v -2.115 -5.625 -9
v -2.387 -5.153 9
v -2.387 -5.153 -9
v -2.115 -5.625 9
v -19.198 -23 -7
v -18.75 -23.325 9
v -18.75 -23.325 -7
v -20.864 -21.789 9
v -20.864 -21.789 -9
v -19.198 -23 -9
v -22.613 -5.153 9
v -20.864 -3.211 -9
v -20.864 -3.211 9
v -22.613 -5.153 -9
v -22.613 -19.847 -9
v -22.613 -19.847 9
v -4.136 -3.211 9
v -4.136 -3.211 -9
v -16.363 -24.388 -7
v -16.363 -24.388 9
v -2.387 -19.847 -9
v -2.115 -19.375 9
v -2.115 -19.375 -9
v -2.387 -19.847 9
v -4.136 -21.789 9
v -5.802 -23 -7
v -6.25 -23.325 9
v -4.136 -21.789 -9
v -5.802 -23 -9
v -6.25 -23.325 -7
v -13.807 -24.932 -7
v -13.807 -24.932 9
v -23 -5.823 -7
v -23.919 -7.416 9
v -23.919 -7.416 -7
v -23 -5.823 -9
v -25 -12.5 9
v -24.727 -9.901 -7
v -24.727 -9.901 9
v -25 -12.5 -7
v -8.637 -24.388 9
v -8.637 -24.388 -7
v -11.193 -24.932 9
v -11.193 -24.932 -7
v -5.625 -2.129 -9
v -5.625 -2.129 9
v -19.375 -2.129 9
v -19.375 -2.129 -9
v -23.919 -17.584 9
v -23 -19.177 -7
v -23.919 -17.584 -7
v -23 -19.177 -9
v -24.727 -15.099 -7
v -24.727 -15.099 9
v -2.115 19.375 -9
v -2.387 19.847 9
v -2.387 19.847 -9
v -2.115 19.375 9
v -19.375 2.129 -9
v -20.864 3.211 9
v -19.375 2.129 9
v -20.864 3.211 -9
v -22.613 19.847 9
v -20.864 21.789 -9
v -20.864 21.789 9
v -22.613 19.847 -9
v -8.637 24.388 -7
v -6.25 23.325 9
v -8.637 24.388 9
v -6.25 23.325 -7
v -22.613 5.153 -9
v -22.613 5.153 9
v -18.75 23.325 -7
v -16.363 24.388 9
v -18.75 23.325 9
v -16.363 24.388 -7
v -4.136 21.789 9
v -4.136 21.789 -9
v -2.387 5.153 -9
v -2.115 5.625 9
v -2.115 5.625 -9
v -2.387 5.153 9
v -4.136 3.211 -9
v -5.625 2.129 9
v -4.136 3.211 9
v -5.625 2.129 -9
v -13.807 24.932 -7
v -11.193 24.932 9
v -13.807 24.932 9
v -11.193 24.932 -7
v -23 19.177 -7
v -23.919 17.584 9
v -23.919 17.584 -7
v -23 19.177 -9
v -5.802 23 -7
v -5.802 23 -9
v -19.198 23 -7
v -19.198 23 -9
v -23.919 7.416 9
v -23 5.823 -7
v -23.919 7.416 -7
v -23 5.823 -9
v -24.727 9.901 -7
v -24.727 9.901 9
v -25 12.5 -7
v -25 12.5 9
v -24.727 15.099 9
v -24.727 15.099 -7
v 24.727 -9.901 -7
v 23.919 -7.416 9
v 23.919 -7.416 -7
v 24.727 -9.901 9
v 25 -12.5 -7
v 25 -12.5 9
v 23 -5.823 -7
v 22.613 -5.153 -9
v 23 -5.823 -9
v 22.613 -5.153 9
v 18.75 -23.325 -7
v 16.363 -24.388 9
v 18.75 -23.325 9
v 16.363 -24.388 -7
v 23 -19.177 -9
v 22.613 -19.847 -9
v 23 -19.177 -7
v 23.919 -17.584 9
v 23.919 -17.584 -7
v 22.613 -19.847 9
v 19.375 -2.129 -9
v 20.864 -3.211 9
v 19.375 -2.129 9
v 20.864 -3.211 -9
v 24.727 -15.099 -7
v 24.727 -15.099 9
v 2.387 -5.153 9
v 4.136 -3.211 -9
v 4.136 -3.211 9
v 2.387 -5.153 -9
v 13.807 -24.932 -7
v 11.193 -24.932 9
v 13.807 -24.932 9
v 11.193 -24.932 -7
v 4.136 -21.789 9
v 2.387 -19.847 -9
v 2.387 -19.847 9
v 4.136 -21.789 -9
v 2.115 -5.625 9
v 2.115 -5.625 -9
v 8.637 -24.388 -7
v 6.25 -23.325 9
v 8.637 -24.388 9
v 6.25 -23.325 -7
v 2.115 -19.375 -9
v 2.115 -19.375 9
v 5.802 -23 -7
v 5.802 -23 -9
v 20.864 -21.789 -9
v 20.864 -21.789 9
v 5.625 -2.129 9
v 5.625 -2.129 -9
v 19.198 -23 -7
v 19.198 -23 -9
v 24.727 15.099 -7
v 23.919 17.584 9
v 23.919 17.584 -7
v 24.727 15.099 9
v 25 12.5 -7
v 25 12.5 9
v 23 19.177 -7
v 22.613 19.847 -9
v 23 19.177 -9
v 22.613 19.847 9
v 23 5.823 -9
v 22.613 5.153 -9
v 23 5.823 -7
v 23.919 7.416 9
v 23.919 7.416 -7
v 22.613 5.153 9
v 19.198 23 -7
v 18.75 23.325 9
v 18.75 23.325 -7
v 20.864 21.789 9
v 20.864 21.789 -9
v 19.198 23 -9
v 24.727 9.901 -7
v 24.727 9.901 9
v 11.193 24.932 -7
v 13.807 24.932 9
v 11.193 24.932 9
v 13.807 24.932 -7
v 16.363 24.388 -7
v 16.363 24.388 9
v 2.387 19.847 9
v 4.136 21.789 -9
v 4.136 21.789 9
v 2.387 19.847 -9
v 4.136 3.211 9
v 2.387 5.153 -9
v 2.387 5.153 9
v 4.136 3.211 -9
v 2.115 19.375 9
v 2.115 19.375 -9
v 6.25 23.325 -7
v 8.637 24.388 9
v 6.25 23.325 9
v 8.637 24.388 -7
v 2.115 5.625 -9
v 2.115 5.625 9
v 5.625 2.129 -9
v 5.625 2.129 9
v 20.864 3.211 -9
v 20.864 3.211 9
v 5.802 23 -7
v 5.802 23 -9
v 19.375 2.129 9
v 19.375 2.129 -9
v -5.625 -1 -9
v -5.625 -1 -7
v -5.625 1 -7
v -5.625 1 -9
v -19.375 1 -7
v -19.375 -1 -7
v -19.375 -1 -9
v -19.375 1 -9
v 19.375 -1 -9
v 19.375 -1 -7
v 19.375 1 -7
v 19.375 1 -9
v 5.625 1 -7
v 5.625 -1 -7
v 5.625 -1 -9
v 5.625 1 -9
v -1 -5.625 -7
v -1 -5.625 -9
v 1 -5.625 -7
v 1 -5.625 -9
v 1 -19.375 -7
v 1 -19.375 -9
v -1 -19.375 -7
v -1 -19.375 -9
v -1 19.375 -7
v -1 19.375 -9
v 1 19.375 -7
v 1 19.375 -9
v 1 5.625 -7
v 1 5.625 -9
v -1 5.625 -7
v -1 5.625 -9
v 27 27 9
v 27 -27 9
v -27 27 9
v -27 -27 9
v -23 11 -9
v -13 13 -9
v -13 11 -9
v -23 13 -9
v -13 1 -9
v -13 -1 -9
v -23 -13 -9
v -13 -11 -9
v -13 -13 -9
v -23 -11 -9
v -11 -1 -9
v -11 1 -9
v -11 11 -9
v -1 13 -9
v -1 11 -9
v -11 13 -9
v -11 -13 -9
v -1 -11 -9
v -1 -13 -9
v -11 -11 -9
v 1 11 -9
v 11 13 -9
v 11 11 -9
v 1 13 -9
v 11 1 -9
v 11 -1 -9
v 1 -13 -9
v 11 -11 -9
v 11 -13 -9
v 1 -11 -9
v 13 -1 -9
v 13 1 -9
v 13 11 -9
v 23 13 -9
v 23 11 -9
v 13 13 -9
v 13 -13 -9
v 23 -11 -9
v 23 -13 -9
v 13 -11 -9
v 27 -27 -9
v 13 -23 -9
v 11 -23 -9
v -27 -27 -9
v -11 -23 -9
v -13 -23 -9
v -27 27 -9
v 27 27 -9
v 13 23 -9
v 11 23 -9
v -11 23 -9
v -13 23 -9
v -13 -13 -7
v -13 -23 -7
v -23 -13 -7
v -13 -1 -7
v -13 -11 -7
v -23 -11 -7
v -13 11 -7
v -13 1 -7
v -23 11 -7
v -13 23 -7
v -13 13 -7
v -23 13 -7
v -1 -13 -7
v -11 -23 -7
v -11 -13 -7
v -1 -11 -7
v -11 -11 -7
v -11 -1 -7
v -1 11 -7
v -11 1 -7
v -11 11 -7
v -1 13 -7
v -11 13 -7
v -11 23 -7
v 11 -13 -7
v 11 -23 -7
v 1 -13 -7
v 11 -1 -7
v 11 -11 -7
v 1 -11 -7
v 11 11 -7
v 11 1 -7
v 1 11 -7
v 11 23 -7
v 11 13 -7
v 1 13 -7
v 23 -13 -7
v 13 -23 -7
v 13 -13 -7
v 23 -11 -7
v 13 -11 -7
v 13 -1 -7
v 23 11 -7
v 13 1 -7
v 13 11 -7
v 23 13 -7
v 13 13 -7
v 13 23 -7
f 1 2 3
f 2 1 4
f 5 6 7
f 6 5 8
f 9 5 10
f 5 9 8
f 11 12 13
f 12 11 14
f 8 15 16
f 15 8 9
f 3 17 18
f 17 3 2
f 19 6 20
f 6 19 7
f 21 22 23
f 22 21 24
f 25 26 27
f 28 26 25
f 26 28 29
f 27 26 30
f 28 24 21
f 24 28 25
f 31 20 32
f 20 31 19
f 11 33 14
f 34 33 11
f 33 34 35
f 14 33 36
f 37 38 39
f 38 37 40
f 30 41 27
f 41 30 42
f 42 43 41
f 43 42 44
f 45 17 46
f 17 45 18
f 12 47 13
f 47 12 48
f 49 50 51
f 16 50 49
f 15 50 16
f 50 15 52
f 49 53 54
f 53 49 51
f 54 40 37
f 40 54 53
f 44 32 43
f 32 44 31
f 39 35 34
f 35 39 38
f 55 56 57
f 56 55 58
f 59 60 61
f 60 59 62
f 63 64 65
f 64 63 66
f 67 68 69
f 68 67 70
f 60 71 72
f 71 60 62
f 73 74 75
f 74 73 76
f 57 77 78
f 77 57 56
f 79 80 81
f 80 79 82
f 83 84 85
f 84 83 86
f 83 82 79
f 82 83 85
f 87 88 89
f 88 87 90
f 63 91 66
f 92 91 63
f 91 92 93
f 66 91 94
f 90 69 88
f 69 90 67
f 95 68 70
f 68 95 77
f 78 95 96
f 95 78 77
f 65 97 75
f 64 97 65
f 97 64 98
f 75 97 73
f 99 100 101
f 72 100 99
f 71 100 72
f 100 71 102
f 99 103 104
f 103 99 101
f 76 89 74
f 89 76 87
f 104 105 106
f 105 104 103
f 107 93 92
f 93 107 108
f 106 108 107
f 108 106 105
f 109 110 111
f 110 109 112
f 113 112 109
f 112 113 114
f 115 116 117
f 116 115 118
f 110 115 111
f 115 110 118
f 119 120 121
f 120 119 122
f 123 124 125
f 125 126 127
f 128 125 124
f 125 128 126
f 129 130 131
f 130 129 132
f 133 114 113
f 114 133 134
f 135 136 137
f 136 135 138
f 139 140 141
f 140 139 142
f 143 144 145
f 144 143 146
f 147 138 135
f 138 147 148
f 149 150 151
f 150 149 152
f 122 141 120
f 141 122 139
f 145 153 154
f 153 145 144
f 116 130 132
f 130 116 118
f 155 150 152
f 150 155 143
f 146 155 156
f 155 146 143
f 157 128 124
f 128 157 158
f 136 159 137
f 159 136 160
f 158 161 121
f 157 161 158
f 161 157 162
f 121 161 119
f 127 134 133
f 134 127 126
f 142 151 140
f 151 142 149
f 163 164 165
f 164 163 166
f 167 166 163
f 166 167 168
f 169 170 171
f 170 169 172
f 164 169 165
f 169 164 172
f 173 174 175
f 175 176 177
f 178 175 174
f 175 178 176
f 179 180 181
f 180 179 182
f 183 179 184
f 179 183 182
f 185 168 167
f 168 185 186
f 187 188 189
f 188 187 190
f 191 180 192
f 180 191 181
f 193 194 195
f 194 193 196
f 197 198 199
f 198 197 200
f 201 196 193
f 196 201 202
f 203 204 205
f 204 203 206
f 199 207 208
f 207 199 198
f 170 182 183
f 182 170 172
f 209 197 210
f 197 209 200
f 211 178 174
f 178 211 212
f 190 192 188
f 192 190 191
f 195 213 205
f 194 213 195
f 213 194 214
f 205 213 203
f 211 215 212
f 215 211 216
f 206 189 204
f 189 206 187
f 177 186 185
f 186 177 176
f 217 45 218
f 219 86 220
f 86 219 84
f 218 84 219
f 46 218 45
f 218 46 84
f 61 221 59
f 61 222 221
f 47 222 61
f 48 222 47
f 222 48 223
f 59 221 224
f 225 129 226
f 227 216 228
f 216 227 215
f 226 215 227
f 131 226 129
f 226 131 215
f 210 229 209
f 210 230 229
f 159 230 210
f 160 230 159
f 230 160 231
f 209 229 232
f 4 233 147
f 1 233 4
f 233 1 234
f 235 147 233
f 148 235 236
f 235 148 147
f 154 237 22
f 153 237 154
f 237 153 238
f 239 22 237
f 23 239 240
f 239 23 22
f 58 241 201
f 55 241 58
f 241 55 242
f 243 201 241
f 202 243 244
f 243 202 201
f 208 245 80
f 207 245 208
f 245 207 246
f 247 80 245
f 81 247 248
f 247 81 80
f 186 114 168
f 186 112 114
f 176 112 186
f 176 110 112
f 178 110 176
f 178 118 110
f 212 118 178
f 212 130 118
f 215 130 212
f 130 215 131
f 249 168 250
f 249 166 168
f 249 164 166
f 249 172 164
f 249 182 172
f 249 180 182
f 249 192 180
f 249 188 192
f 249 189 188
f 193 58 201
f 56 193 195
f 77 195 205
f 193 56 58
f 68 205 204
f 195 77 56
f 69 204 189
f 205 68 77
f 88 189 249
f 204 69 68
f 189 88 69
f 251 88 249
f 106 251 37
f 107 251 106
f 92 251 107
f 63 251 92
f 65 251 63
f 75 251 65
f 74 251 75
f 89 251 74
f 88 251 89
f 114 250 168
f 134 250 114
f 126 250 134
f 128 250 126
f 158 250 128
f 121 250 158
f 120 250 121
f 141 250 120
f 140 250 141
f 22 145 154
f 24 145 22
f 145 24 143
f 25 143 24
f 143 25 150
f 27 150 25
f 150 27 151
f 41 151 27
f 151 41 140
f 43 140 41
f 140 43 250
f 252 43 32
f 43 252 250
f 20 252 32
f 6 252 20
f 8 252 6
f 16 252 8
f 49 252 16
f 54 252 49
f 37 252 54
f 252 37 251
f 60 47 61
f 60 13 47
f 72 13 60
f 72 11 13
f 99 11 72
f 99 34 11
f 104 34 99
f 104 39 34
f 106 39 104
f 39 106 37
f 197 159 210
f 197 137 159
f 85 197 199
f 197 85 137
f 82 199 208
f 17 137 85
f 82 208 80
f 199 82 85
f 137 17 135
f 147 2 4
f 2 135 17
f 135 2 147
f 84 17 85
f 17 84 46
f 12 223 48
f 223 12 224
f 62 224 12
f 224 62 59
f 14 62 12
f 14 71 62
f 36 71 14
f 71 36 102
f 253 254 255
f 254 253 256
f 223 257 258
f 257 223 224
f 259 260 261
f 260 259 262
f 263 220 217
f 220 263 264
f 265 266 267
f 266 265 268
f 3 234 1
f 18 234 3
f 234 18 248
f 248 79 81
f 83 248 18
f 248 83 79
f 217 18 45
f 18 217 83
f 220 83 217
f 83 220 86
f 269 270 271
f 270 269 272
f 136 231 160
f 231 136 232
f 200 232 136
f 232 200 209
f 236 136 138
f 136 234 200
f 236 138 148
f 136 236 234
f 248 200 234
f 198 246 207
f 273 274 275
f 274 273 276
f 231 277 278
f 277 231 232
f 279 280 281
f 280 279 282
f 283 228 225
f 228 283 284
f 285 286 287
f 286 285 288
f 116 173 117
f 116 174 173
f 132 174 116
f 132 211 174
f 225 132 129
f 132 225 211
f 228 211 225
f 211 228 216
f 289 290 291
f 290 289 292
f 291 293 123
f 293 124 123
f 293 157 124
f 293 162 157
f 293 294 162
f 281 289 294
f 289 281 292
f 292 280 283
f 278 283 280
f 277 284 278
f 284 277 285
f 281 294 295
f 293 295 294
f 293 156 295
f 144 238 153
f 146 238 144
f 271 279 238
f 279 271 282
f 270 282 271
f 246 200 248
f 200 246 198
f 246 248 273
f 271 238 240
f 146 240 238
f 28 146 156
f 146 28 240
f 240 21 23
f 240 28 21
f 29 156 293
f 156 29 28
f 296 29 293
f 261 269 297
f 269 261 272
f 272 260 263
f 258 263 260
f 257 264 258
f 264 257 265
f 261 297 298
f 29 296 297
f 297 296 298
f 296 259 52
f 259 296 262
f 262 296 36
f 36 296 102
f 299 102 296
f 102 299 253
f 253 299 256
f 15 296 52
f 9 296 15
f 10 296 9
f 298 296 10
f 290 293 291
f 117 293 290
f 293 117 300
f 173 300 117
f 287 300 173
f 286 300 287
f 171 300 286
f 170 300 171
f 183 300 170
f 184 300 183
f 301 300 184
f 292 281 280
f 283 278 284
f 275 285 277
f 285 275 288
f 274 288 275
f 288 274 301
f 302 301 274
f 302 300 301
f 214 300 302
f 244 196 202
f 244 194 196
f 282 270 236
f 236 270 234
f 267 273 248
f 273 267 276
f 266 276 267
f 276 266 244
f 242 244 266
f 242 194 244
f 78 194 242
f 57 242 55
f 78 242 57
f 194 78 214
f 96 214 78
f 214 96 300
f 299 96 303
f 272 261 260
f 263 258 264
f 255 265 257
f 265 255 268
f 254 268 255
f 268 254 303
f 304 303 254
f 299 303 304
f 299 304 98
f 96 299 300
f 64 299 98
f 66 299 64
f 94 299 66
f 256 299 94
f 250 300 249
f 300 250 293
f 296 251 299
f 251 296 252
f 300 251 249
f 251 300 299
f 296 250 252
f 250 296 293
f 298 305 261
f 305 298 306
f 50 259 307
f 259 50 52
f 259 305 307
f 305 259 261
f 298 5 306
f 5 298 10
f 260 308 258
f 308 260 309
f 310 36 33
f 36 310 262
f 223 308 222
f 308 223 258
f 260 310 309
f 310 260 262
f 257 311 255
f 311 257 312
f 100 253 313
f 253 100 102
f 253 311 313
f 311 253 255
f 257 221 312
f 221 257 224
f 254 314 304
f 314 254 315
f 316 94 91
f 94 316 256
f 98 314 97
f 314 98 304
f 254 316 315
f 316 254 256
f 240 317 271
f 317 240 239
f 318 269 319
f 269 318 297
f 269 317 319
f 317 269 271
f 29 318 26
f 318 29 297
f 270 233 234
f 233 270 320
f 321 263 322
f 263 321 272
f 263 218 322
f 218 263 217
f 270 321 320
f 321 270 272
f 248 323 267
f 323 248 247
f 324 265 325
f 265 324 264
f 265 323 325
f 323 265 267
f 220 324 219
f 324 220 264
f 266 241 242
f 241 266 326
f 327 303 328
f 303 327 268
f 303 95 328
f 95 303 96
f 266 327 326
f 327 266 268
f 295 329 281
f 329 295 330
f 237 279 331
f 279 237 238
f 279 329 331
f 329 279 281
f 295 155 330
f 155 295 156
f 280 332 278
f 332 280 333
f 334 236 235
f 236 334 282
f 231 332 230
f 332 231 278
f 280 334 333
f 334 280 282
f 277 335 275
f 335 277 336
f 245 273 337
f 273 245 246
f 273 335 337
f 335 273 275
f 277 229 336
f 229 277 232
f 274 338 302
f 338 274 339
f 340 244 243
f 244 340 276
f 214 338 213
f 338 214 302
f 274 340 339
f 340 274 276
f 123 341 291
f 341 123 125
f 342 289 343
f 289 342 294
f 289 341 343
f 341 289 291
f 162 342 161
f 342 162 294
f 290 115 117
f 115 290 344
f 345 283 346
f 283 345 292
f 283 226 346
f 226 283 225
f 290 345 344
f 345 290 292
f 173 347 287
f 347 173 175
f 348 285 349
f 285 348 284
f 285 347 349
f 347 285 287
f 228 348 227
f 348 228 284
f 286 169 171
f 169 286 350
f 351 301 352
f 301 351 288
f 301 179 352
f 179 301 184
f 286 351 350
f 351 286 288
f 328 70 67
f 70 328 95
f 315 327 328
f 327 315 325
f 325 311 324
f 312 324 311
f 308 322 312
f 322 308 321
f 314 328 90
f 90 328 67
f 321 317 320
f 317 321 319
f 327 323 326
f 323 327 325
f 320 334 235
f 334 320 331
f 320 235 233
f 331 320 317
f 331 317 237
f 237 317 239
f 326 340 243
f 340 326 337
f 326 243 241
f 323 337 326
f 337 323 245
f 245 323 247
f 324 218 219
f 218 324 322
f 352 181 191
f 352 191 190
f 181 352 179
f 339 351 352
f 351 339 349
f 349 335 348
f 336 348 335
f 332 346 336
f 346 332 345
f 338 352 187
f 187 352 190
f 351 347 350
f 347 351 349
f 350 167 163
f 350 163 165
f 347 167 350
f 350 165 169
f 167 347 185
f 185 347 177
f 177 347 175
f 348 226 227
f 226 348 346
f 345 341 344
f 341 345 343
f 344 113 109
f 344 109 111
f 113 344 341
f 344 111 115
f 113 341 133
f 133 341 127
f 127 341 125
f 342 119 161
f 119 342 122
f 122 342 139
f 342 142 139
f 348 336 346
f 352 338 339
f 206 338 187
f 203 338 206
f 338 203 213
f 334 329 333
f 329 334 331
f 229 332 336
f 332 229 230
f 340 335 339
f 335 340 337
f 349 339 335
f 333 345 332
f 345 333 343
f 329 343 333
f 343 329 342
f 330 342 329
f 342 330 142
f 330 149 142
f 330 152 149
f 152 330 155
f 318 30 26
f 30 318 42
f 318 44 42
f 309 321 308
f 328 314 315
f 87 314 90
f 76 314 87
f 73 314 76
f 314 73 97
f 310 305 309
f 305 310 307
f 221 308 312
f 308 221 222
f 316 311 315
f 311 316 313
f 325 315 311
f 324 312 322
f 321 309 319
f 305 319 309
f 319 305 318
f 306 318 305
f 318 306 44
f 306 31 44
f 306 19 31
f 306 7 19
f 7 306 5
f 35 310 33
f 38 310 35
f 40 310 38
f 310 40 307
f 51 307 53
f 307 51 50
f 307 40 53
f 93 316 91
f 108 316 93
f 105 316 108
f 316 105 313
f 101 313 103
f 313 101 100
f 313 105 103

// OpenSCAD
// file: fly_tray_modules.scad
// Contains all the necessary functions and parameters to make trays

// tray-related parameters
tr_h = 20; // mm; (should be approx food height)
sd_th = 1; // mm; 
m_th = 2; // mm; 
m_d = 10; // mm;

// vial-related parameters
v_dia = 25; // mm; vial diameter (add necessary buffer)

// bottle-related parameters
b_t_a = 55; // mm; bottle size (height same as others)
b_a = 57; // mm; effective bottle holder taking into account gaps

// base tray parameters
bs_th = 1.5; //mm; (base thickness)
bs_h = bs_th + 10; //mm; (height of base tray)

// functions
function tray_dims (h, i_a, rows, cols) = [rows*i_a, cols*i_a, h];
function tray_size (a,sd_th=sd_th) = a + [2*sd_th, 2*sd_th, 0];

// modules
module base_tray(a, sd_th, m_th, m_d){
    
    a_t = a + [2*sd_th, 2*sd_th, 0];
    
    // make side tray
    union() {
        difference(){
            cube(a_t, center=true);
            cube(a + [0,0,0.1], center=true);
        }
        
        translate([0,0,-a[2]/2+m_th/2]) mesh_sheet(a_t, m_th, m_d);
    }
    
}

module mesh_sheet(a, th, d){
    // makes mesh sheets
    
    // input wrangling
    l = is_list(a) ?  a[0] : a;
    w = is_list(a) ?  a[1] : a;
    
    // find how many meshes will fit inside this sheet
    n_l = floor(l / (d+th));
    n_w = floor(w / (d+th));
    

    // make mesh
    difference(){
        // base cube
        cube([l, w, th], center=true);
        
        trans = th+d;
        x_pos = [-(n_l/2)+0.5:1:(n_l/2)-0.5];
        y_pos = [-(n_w/2)+0.5:1:(n_w/2)-0.5];

        // subtract cubes to create mesh
        for (i=x_pos, j=y_pos)
            translate([i*trans, j*trans, 0]) cube([d,d,th+0.1], center=true);        
    }
}

module vial_tray(a, v_dia, v_red=0.5){
    // input wrangling
    rows = a[0]/v_dia;
    cols = a[1]/v_dia;
    
    trans = v_dia;
    x_pos = [-(rows/2)+0.5:1:(rows/2)-0.5];
    y_pos = [-(cols/2)+0.5:1:(cols/2)-0.5];
    
    // make holed cube
    difference(){
        cube(a, center=true);
        
        // subtract cylinders to create vial holes
        for (i=x_pos, j=y_pos)
            translate([i*trans, j*trans, 0]) cylinder(h=a[2]+0.1, d=v_dia, center=true); 
        
        // reduce material
        for (i=x_pos)
            translate([i*trans,0,0]) cube([v_red*v_dia,a[1]-v_dia, a[2]+0.1], center=true);
        
        for (j=y_pos)
            translate([0,j*trans,0]) cube([a[0]-v_dia, v_red*v_dia, a[2]+0.1], center=true);
        
    }    
}


module bottle_tray(a, b_a, b_t_a, v_red=0.8){
    // input wrangling
    rows = a[0]/b_a;
    cols = a[1]/b_a;
    
    trans = b_a;
    x_pos = [-(rows/2)+0.5:1:(rows/2)-0.5];
    y_pos = [-(cols/2)+0.5:1:(cols/2)-0.5];
    
    // make holed cube
    difference(){
        cube(a, center=true);
        
        // subtract cubes to create bottle holes
        for (i=x_pos, j=y_pos)
            translate([i*trans, j*trans, 0]) cube([b_t_a, b_t_a, a[2]+0.1],center=true);
        
        // reduce material
        for (i=x_pos)
            translate([i*trans,0,0]) cube([v_red*b_a,a[1]-b_a, a[2]+0.1], center=true);
        
        for (j=y_pos)
            translate([0,j*trans,0]) cube([a[0]-b_a, v_red*b_a, a[2]+0.1], center=true);
        
    }    
    
}

module tray_sides(a, th){
    
    // make side tray
    difference(){
        cube(a + [2*th, 2*th, 0], center=true);
        cube(a + [0,0,0.1], center=true);
        }
    
}
// main file
include <fly_tray_modules.scad>

// My custom trays

//// Base tray for stocks
//t1 = tray_size(tray_dims(tr_h, v_dia, 10, 1));
//t2 = tray_size(tray_dims(tr_h, v_dia, 10, 2));
//t3 = tray_size(tray_dims(tr_h, v_dia, 10, 1));
//a = [t1[0],t1[1]+t2[1]+t3[1],bs_h] + [0.2, 0.2, 0];
//echo(a)
//base_tray(a, bs_th, m_th, m_d/2);    

//// Base tray for crosses
//t1 = tray_size(tray_dims(tr_h, v_dia, 5, 2));
//t2 = tray_size(tray_dims(tr_h, v_dia, 5, 6));
//a = [t1[0],t1[1]+t2[1],bs_h] + [0.2, 0.2, 0];
//echo(a)
//base_tray(a, bs_th, m_th, m_d/2);

//// Base tray for emergence vial trays
//t1 = tray_size(tray_dims(tr_h, v_dia, 6, 3));
//t2 = tray_size(tray_dims(tr_h, v_dia, 6, 3));
//t3 = tray_size(tray_dims(tr_h, v_dia, 6, 3));
//t4 = tray_size(tray_dims(tr_h, v_dia, 6, 3));
//a = [t1[0]+t2[0],t3[1]+t4[1],bs_h] + [0.2, 0.2, 0];
//echo(t1);
//echo(a);
//base_tray(a, bs_th, m_th, m_d/2); 

//// Emergence bottle tray (no need of a base tray)
//t1 = tray_dims(tr_h, b_a, 4, 3);     // Bottle tray
//t1_s = tray_size(t1);
//echo(t1_s);
//t2 = tray_dims(tr_h, v_dia, 1, 6);   // Vial tray
//t2_s = tray_size(t2);
//echo(t2_s);
//
//union(){
//    union(){
//        bottle_tray(t1, b_a, b_t_a, v_red=0.55);
//        base_tray(t1, sd_th, m_th, m_d=7.5);    
//    }
//    
//    translate([t1_s[0]/2+t2_s[0]/2,0,0]){
//        union(){
//            vial_tray(t2, v_dia, v_red=0.55);
//            base_tray(t2, sd_th, m_th, m_d=7.5);    
//        }
//    }
//    
//    translate([-t1_s[0]/2-t2_s[0]/2,0,0]){
//        union(){
//            vial_tray(t2, v_dia, v_red=0.55);
//            base_tray(t2, sd_th, m_th, m_d=7.5);    
//        }
//    }
//
//}

// Vial tray for emergence bottle
t1 = tray_size(tray_dims(tr_h-m_th, v_dia, 2, 2), 2);
echo(t1);
// Generate vial tray
a = tray_dims(tr_h-m_th, v_dia, 2, 2);

union(){
    vial_tray(a, v_dia, v_red=0.55);
    base_tray(a, 2, m_th, 1*m_d);    
}
